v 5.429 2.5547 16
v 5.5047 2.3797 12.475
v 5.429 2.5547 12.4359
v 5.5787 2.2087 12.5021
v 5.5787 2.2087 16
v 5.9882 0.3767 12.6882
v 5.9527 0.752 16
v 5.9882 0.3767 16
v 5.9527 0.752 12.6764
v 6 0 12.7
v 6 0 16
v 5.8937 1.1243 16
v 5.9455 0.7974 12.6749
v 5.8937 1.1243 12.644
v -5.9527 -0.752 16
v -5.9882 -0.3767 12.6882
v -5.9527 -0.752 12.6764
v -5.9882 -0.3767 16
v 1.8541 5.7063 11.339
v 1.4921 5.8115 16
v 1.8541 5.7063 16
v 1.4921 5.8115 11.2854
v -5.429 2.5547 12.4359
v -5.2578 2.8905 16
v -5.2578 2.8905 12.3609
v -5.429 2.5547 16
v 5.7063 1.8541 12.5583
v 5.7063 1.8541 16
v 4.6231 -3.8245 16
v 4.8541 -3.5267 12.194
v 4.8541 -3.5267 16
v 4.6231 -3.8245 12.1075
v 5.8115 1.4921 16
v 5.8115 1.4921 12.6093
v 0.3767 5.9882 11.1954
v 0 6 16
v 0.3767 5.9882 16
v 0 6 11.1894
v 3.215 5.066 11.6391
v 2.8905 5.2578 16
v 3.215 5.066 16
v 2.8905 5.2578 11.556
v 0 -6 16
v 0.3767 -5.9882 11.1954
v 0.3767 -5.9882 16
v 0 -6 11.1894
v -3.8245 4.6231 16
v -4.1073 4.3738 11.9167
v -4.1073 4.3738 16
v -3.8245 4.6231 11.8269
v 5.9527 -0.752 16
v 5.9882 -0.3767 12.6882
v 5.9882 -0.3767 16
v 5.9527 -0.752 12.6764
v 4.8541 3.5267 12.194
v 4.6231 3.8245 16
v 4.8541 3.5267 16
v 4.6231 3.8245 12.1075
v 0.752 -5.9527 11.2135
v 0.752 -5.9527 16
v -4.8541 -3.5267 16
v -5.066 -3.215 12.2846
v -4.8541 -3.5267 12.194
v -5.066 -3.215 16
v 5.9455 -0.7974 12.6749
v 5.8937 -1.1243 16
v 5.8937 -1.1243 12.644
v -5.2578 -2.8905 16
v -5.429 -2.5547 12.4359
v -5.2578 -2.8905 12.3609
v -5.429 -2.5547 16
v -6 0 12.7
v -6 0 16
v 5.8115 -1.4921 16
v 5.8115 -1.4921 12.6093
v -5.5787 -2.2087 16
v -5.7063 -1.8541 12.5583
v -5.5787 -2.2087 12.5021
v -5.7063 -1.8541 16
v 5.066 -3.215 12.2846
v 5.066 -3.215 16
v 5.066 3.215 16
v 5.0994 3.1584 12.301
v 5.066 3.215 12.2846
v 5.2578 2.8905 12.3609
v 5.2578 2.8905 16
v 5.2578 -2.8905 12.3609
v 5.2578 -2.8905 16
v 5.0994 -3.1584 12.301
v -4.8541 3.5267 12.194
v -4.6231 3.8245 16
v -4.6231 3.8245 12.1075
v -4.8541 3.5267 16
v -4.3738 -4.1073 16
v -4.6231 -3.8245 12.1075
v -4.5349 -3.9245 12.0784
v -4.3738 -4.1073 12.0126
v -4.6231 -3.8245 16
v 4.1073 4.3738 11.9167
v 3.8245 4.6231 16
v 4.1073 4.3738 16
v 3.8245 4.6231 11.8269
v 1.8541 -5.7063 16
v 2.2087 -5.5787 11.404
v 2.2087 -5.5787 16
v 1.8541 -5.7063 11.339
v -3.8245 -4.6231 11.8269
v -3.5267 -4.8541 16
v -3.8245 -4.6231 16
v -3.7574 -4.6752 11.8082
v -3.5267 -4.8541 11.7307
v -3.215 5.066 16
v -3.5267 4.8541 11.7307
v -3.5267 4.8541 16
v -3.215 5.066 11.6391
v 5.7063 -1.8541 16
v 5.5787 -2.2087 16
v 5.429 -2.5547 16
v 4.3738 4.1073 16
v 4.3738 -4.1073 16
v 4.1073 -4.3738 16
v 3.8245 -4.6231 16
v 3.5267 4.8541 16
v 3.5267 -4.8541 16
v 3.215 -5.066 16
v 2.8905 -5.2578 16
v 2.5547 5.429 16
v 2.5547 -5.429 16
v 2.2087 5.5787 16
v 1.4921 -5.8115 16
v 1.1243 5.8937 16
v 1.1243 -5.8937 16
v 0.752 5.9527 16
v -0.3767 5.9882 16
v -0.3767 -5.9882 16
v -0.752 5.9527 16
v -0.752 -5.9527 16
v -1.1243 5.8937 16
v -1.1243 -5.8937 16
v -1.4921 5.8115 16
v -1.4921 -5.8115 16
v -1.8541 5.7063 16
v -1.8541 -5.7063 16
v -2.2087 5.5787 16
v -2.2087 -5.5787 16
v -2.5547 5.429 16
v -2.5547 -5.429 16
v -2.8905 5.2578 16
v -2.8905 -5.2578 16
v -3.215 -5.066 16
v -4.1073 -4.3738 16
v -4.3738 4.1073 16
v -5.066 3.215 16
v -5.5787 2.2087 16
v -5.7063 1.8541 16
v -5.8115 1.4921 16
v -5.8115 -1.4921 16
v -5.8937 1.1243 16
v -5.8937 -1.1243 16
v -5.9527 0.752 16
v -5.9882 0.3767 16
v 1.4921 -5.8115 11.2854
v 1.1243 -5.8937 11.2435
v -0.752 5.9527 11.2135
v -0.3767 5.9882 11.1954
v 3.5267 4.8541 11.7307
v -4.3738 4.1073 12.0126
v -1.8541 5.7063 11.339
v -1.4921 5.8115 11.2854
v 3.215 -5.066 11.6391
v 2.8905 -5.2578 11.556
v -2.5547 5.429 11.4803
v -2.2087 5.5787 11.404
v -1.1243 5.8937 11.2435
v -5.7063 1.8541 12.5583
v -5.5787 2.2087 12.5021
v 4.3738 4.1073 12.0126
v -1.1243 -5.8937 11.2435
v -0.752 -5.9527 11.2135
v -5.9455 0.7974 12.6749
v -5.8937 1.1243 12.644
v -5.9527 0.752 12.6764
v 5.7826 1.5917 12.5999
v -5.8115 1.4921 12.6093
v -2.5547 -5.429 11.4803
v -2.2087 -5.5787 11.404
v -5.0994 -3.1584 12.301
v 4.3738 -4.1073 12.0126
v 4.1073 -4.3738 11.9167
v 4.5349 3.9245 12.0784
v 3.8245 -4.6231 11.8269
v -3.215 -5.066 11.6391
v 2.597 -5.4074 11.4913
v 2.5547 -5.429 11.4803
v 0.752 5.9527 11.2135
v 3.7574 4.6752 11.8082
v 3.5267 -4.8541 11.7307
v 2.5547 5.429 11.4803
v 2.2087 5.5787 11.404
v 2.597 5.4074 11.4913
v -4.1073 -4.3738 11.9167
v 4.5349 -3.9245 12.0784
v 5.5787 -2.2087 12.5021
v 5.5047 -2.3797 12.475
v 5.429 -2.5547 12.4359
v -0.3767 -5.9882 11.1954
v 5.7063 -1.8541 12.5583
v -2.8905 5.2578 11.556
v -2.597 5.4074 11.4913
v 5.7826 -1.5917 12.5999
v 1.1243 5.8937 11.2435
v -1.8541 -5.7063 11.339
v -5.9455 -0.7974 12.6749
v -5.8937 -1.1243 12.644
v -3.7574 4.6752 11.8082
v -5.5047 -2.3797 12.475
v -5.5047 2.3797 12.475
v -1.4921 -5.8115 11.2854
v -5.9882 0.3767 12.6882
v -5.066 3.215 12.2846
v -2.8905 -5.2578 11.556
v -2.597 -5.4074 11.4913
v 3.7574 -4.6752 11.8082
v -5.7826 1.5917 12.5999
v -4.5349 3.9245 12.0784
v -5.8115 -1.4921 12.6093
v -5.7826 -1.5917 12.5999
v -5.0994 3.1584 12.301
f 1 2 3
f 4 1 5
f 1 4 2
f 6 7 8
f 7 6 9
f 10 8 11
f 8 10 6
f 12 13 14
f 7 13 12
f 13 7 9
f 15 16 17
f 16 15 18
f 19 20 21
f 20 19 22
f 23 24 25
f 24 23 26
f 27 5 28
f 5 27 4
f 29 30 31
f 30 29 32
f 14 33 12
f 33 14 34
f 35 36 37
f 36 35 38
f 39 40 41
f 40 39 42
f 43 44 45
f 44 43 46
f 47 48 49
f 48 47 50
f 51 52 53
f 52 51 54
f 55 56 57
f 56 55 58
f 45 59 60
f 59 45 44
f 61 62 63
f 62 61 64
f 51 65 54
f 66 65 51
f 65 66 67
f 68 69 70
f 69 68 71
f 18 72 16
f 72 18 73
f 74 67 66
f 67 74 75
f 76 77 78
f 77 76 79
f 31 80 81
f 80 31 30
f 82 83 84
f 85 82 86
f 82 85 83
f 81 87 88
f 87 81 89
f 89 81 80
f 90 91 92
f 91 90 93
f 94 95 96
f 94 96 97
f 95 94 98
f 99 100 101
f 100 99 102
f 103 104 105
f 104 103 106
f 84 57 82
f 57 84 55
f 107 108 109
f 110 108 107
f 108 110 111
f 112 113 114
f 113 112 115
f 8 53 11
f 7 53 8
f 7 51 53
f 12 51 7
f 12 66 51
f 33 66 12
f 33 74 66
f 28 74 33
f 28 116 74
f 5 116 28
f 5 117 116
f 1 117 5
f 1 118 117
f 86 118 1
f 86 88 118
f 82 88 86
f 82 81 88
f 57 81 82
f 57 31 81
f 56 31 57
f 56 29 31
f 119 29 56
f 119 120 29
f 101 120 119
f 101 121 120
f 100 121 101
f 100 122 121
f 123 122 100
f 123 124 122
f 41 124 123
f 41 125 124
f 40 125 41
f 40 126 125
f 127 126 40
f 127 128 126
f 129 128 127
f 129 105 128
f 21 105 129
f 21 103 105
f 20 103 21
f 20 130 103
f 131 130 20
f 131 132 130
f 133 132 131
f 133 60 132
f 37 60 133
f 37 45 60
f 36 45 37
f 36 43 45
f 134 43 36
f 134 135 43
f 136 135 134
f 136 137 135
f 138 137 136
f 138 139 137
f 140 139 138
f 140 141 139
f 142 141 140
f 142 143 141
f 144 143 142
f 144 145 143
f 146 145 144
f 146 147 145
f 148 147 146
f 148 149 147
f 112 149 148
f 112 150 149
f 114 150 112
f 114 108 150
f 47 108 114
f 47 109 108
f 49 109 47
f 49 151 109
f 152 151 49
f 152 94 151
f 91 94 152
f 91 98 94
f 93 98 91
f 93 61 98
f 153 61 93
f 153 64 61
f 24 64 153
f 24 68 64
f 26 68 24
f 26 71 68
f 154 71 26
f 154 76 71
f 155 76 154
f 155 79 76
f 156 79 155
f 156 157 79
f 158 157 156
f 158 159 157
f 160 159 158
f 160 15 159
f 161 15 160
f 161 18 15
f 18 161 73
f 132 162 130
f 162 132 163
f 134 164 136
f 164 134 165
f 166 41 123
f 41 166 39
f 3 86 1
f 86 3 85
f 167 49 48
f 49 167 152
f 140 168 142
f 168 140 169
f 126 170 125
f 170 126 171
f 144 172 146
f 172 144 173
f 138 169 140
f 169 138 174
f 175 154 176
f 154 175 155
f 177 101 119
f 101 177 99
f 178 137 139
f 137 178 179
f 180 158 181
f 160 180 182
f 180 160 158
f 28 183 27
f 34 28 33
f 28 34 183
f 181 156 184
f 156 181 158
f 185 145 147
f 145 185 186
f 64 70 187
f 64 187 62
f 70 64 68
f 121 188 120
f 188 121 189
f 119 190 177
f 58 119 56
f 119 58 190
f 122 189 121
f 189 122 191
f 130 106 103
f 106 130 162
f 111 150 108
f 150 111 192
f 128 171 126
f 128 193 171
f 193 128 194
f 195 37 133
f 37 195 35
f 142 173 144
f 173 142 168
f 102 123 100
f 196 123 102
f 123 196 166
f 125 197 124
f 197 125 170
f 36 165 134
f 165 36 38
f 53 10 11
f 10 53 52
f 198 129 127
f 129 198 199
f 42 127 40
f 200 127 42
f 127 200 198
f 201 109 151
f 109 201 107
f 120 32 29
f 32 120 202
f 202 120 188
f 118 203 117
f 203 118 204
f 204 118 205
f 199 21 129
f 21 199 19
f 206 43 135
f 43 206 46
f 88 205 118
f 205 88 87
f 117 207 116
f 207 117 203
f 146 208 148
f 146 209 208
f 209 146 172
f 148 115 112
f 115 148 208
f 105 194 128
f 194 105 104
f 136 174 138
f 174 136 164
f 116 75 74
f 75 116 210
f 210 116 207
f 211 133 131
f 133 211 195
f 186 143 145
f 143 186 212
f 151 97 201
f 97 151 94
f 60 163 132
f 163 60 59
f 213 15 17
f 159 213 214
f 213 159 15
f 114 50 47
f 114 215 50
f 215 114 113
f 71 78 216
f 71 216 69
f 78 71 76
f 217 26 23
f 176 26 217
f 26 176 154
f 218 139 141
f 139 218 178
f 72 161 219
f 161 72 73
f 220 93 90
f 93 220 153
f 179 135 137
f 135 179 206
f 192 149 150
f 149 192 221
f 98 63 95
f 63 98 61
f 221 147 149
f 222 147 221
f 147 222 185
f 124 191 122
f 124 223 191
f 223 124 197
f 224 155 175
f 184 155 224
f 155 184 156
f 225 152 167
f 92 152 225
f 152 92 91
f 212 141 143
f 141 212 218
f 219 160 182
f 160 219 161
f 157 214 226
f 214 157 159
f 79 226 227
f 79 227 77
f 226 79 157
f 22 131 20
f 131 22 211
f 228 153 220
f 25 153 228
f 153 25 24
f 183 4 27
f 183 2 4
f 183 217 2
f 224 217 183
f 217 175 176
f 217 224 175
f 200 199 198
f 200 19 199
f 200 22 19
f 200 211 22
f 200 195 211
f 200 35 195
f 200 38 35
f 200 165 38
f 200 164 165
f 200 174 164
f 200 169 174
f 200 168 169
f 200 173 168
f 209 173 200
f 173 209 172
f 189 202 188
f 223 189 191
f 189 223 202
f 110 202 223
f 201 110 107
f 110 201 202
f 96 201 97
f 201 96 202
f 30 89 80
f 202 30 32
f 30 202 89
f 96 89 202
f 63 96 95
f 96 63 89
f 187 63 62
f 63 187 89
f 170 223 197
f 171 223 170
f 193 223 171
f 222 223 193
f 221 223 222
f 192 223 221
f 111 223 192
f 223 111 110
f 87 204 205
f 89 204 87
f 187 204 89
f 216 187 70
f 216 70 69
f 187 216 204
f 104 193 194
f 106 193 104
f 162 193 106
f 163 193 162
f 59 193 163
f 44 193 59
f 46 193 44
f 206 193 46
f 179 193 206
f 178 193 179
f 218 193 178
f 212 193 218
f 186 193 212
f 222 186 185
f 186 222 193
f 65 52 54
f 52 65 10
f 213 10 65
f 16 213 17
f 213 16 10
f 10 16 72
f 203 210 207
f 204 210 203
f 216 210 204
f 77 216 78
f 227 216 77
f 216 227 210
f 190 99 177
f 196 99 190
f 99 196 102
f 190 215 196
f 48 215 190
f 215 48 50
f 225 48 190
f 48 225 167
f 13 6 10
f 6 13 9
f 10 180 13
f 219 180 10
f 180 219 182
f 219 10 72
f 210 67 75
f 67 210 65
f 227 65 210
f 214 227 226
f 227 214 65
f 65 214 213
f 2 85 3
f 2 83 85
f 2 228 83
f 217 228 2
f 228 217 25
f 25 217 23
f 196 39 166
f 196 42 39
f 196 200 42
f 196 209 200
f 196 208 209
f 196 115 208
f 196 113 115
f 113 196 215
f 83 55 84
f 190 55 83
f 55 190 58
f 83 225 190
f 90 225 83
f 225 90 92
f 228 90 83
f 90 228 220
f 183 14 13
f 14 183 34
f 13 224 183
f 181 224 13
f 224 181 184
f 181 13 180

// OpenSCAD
// file: ../roundCornersCube.scad
/*
http://codeviewer.org/view/code:1b36 
Copyright (C) 2011 Sergio Vilches
This program is free software: you can redistribute it and/or modify it under the terms of the GNU General Public License as published by the Free Software Foundation, either version 3 of the License, or (at your option) any later version.
This program is distributed in the hope that it will be useful, but WITHOUT ANY WARRANTY; without even the implied warranty of MERCHANTABILITY or FITNESS FOR A PARTICULAR PURPOSE. See the GNU General Public License for more details. You should have received a copy of the GNU General Public License along with this program. If not, see <http://www.gnu.org/licenses/>.
Contact: s.vilches.e@gmail.com


    ----------------------------------------------------------- 
                 Round Corners Cube (Extruded)                
      roundCornersCube(x,y,z,r) Where:                        
         - x = Xdir width                                     
         - y = Ydir width                                     
         - z = Height of the cube                             
         - r = Rounding radious                               
                                                              
      Example: roundCornerCube(10,10,2,1);                    
     *Some times it's needed to use F6 to see good results!   
 	 ----------------------------------------------------------- 
*/
// Test it!
// roundCornersCube(10,5,2,1);


module createMeniscus(h,radius) // This module creates the shape that needs to be substracted from a cube to make its corners rounded.
difference(){        //This shape is basicly the difference between a quarter of cylinder and a cube
   translate([radius/2+0.1,radius/2+0.1,0]){
      cube([radius+0.2,radius+0.1,h+0.2],center=true);         // All that 0.x numbers are to avoid "ghost boundaries" when substracting
   }

   cylinder(h=h+0.2,r=radius,$fn = 25,center=true);
}


module roundCornersCube(x,y,z,r)  // Now we just substract the shape we have created in the four corners
difference(){
   cube([x,y,z], center=true);

translate([x/2-r,y/2-r]){  // We move to the first corner (x,y)
      rotate(0){  
         createMeniscus(z,r); // And substract the meniscus
      }
   }
   translate([-x/2+r,y/2-r]){ // To the second corner (-x,y)
      rotate(90){
         createMeniscus(z,r); // But this time we have to rotate the meniscus 90 deg
      }
   }
      translate([-x/2+r,-y/2+r]){ // ... 
      rotate(180){
         createMeniscus(z,r);
      }
   }
      translate([x/2-r,-y/2+r]){
      rotate(270){
         createMeniscus(z,r);
      }
   }
}
// main file
include <../roundCornersCube.scad>

difference() {
  cylinder($fn = 100, 16,6,6);
  translate([-50,0,0])
    rotate([0,90,0])
      cylinder($fn = 100, 100,12.7,12.7);
}
